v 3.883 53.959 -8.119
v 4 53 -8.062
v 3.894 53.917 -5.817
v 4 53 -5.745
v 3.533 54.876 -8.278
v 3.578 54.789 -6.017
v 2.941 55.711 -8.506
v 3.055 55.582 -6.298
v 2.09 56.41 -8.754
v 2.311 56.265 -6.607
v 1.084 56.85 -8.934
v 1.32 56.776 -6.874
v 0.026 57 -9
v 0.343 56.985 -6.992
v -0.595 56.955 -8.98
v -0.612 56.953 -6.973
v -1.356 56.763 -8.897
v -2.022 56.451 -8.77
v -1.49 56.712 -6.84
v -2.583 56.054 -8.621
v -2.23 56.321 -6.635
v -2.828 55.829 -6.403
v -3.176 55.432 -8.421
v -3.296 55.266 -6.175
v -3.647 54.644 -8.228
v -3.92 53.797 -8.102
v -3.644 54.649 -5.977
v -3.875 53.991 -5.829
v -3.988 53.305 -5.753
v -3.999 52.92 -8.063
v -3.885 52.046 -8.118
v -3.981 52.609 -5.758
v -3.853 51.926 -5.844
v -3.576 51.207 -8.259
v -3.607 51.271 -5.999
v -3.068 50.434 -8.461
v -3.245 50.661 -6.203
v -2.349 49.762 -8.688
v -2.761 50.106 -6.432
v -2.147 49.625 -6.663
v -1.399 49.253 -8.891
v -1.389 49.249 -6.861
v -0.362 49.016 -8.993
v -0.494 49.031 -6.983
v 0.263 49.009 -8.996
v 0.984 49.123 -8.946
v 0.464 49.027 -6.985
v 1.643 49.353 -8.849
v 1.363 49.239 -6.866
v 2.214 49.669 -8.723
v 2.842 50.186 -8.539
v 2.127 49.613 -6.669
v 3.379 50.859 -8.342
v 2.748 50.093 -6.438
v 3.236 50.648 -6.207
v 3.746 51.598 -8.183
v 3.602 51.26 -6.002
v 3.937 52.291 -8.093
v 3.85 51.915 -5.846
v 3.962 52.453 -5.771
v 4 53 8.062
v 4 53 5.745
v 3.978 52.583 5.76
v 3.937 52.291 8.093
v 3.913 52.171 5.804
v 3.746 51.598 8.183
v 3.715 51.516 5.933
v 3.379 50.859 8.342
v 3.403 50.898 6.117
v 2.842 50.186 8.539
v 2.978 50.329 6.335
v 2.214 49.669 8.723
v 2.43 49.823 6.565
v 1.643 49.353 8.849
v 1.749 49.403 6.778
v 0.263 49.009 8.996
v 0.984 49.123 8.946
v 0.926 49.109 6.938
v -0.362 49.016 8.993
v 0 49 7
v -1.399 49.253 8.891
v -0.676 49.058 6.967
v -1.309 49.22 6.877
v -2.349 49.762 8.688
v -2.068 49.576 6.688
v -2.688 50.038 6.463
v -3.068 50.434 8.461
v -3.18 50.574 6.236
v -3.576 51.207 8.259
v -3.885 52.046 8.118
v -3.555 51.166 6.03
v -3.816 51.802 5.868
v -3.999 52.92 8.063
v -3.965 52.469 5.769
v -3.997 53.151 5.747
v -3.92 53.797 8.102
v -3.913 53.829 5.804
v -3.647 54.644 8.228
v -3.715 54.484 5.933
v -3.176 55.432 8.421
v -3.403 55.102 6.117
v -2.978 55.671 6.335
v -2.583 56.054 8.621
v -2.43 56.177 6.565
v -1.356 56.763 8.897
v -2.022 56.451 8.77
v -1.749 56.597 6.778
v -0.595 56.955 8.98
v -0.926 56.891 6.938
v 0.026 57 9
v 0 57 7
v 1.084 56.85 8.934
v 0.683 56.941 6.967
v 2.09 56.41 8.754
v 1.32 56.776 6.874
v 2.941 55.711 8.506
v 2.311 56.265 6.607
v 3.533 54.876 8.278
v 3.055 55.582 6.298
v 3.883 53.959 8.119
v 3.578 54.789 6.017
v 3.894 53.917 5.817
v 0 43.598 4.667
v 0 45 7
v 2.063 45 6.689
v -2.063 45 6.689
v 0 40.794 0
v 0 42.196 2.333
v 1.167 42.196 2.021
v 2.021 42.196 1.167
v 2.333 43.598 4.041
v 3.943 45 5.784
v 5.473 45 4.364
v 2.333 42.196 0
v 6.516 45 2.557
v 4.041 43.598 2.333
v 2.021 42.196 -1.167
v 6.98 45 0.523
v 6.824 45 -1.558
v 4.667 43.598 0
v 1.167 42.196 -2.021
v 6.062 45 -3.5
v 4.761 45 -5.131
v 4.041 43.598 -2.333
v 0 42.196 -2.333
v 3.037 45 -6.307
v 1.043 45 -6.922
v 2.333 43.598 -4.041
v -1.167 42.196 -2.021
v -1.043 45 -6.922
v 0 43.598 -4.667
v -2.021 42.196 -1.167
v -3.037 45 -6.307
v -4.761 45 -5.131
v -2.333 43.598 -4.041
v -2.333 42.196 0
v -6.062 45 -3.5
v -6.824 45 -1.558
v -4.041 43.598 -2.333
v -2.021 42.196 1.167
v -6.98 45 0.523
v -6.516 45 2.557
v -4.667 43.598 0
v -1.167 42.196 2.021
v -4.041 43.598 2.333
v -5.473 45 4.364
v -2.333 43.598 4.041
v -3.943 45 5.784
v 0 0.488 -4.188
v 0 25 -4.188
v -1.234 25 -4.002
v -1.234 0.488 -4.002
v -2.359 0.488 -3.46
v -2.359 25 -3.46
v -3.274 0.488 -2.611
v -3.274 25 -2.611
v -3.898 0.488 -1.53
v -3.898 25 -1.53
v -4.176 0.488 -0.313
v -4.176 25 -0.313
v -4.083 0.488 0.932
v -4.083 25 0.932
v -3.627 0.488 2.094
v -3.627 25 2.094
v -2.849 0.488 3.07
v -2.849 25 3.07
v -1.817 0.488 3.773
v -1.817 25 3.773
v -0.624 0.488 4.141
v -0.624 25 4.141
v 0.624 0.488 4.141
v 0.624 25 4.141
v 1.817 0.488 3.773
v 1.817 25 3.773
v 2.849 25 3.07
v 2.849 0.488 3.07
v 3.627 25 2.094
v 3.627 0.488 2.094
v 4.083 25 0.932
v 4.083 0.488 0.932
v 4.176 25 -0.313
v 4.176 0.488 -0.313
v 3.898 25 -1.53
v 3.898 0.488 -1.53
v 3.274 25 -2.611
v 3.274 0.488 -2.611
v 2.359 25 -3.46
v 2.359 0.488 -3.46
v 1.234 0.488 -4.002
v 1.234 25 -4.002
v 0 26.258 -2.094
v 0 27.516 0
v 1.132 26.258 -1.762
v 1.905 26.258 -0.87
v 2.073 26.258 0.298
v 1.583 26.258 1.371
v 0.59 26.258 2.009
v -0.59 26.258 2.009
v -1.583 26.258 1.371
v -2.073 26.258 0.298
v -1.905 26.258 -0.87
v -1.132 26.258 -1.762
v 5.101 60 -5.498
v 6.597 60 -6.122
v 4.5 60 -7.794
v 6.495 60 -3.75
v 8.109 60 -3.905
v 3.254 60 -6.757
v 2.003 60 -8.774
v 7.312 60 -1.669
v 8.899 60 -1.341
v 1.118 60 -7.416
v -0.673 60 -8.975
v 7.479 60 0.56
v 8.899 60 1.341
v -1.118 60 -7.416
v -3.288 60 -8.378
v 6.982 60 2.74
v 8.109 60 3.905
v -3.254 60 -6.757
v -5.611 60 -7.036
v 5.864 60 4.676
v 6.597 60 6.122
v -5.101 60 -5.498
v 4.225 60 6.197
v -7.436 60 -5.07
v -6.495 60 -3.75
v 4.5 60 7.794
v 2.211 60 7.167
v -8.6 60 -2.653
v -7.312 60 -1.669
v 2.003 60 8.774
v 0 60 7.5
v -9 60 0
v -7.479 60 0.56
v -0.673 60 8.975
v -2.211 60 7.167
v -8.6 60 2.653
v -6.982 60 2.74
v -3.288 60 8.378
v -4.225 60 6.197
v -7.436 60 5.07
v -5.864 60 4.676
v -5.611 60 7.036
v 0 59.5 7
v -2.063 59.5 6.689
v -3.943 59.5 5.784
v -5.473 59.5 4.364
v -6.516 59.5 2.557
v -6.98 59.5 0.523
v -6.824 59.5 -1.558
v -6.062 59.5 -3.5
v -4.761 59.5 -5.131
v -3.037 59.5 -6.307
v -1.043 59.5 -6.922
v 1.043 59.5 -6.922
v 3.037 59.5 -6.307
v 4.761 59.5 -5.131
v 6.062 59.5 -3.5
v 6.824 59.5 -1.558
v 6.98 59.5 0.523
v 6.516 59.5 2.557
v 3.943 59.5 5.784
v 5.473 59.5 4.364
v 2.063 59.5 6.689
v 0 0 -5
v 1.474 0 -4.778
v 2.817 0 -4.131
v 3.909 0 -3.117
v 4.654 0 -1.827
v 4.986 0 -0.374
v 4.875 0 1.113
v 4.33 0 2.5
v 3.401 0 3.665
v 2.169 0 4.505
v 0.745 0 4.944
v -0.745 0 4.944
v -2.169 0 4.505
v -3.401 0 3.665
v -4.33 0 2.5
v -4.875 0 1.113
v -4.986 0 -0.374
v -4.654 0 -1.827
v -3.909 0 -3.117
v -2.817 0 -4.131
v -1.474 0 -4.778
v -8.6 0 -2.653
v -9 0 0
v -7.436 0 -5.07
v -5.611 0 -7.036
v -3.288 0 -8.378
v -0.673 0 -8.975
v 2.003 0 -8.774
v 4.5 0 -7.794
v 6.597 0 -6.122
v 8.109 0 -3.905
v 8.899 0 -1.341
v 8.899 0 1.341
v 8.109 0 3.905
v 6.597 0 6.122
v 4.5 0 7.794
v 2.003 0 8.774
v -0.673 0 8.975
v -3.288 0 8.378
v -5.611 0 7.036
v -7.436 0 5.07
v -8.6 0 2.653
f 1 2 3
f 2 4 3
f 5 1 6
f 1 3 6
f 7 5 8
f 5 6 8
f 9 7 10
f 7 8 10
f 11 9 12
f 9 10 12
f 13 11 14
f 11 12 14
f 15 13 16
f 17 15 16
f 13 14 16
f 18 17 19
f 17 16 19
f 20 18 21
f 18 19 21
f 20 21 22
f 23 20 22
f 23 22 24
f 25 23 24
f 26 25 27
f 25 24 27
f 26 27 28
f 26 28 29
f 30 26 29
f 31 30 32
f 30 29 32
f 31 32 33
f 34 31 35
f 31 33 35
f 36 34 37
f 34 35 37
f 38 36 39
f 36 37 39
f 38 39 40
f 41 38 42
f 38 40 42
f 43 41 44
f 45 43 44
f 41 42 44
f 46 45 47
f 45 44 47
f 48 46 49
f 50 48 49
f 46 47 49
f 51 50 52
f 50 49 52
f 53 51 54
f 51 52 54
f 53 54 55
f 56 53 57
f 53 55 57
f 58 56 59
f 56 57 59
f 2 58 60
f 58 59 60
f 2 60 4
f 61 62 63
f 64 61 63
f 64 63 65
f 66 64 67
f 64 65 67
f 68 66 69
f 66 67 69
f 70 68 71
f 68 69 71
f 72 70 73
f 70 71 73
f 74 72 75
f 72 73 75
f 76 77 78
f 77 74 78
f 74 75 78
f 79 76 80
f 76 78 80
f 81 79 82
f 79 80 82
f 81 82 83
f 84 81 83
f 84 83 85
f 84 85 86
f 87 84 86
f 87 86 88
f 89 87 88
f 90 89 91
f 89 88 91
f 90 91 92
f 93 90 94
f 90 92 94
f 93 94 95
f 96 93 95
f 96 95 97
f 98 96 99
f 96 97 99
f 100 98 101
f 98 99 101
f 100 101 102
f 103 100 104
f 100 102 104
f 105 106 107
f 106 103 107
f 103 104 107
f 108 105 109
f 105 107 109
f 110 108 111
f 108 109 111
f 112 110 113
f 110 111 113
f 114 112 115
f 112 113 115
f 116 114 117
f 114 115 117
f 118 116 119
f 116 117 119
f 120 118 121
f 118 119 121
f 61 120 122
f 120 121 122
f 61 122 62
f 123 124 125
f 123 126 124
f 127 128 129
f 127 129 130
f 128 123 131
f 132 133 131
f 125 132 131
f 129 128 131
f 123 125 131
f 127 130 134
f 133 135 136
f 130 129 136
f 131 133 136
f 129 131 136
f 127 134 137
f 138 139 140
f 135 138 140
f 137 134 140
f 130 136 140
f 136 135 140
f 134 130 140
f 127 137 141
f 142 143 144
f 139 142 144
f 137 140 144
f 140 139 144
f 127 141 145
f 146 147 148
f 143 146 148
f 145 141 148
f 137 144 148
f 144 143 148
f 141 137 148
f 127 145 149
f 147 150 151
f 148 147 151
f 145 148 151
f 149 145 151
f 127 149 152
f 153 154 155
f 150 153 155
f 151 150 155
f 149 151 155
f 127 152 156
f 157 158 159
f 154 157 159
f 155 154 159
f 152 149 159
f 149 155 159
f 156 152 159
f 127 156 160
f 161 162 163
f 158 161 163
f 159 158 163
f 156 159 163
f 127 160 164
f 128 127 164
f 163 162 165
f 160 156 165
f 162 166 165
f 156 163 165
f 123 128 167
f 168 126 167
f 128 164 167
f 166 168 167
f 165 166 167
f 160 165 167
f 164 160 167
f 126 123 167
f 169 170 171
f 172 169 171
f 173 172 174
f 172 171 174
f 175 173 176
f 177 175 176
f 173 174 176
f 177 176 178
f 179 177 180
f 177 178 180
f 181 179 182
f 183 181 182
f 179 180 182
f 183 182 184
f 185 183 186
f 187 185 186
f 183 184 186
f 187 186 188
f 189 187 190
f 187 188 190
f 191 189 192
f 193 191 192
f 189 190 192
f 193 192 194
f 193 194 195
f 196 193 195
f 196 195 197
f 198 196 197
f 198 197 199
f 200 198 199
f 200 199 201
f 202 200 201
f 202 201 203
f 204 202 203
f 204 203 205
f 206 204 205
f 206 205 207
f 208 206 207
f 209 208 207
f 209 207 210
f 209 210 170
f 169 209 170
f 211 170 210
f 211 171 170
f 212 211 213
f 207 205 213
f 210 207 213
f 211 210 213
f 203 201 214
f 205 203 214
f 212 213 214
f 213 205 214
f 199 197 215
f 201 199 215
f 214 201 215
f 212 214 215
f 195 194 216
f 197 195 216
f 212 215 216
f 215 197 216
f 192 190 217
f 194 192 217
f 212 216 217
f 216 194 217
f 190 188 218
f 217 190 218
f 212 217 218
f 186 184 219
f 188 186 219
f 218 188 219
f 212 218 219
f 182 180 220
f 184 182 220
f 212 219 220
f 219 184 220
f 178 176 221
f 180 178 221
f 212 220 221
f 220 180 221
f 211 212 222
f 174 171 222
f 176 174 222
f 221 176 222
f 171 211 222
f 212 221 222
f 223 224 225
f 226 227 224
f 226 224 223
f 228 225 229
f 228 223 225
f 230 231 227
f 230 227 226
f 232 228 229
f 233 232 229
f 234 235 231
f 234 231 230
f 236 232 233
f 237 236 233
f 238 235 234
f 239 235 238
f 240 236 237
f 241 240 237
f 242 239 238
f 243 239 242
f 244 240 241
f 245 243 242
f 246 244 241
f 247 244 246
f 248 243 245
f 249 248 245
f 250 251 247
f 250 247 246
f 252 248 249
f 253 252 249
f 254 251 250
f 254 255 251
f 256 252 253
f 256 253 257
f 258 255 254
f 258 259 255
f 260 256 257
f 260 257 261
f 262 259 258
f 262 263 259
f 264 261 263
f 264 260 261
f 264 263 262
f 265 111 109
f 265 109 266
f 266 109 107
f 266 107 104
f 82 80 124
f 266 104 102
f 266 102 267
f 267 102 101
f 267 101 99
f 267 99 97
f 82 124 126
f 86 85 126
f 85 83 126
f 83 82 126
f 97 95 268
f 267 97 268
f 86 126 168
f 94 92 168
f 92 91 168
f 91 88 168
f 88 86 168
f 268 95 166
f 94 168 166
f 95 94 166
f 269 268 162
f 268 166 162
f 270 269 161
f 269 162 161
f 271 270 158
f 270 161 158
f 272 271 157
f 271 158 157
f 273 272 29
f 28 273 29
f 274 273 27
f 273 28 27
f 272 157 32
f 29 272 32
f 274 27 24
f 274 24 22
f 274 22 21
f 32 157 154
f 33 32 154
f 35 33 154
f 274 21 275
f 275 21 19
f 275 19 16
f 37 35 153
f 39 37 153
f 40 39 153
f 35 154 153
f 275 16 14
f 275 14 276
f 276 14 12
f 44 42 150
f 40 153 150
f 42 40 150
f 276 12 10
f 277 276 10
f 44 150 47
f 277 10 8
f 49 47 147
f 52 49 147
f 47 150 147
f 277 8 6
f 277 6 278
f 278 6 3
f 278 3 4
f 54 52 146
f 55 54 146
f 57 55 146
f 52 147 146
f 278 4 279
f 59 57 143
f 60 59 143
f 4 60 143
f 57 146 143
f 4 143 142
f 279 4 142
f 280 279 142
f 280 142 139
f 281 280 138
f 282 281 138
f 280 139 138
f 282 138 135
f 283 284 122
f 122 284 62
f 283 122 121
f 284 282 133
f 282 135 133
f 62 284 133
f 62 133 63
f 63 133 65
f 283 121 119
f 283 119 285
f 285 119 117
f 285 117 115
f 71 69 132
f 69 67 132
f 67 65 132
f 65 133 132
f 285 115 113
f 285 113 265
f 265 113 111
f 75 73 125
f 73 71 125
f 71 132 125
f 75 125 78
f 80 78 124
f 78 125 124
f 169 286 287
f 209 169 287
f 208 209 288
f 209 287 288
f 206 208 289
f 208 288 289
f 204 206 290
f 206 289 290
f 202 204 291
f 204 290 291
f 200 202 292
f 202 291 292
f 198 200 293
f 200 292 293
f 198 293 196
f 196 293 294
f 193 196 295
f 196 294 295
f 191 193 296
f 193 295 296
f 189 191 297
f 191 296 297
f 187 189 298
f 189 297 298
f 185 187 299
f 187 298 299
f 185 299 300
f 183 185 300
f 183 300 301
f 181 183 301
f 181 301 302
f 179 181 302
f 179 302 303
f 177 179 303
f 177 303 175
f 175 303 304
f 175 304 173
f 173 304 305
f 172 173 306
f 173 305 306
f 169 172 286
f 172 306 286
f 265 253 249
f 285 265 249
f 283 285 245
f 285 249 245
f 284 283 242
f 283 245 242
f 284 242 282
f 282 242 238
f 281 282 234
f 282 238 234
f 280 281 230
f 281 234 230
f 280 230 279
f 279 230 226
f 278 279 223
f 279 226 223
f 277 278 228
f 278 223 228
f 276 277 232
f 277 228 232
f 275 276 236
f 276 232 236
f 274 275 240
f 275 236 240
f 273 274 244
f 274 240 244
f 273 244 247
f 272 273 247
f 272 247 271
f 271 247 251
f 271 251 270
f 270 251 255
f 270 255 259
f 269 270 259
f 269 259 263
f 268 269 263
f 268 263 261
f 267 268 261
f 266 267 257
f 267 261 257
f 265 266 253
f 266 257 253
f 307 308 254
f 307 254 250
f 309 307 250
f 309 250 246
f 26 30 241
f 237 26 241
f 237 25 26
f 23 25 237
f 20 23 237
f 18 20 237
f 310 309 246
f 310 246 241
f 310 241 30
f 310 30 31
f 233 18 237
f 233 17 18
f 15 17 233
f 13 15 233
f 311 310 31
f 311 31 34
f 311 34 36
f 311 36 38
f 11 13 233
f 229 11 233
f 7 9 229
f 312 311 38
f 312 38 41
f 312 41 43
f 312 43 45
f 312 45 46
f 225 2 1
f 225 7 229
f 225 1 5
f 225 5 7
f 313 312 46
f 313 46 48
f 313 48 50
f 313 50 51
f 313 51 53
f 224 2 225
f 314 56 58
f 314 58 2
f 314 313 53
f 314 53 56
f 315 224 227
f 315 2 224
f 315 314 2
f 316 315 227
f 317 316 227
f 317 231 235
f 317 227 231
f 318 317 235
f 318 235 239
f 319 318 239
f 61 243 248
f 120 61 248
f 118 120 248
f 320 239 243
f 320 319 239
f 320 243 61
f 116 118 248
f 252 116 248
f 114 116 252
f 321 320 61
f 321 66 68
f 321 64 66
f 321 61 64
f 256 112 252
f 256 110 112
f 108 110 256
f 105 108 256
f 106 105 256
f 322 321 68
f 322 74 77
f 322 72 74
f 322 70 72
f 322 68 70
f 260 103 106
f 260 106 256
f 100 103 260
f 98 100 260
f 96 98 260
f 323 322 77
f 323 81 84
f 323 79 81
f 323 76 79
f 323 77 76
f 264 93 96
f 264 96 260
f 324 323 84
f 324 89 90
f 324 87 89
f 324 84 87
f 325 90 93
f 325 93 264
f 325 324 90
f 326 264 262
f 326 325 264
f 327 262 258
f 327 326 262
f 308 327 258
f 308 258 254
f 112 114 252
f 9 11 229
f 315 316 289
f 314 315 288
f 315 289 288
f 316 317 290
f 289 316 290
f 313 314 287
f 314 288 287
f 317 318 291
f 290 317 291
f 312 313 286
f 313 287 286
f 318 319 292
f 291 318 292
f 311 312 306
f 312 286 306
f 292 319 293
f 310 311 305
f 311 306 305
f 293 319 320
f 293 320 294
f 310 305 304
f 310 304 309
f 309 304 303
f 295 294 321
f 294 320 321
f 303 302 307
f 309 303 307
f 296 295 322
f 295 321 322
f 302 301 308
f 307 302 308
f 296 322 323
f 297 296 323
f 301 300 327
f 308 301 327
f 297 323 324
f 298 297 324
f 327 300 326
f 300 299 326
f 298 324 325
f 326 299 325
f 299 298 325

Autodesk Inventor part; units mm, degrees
ref_plane "YZ Plane" through (0, 0, 0) normal (1, 0, 0) x (0, 1, 0)
ref_plane "XZ Plane" through (0, 0, 0) normal (0, 1, 0) x (-1, 0, 0)
ref_plane "XY Plane" through (0, 0, 0) normal (0, 0, 1) x (1, 0, 0)
sketch "Sketch2" plane through (0, 0, 0) normal (0, 1, 0) x (-1, 0, 0)
  circle A0 centre (0, 0) radius 9
  dimension "d2" = 18
extrude "Extrusion2" add sketch "Sketch2" along normal blind 60
hole "Hole1" at (0, 0, 0) direction (0, 1, 0) diameter 8.376 depth 25 tip angle 118 countersink diameter 10 countersink angle 118 thread size "M10x1.5" class "6H" standard "ISO Metric profile"
sketch "Sketch3" plane through (0, 60, 0) normal (0, 1, 0) x (1, 0, 0)
  point P0 (0, 0)
  point P1 (0, 0)
hole "Hole2" at (0, 60, 0) direction (0, -1, 0) diameter 14 depth 15 tip angle 118
sketch "Sketch4" plane through (0, 0, 0) normal (0, 0, 1) x (1, 0, 0)
  circle A0 centre (0, 53) radius 4
  line L0 (9, 60) -> (-9, 60) projected
  point P0 (0, 0)
  point P1 (0, 60)
  dimension "d20" = 8
  dimension "d21" = 7
extrude "Extrusion3" cut sketch "Sketch4" along normal through all both and the other way through all
chamfer "Chamfer3" distance 0.5 angle 45 1 edges at (0, 60, -7)
sketch "Sketch6" plane through (0, 60, 0) normal (0, 1, 0) x (1, 0, 0)
  circle A0 centre (0, 0) radius 9 projected
  line L0 (-9, 0) -> (9, 0)
  line L1 (9, 0) -> (9, 9)
  line L2 (9, 9) -> (-9, 9)
  line L3 (-9, 9) -> (-9, 0)
  dimension "d38" = 9
  dimension "d39" = 18
extrude "Extrusion5" [suppressed]
properties part number "RS-STT-103" material "11 110 (1.0721)"
